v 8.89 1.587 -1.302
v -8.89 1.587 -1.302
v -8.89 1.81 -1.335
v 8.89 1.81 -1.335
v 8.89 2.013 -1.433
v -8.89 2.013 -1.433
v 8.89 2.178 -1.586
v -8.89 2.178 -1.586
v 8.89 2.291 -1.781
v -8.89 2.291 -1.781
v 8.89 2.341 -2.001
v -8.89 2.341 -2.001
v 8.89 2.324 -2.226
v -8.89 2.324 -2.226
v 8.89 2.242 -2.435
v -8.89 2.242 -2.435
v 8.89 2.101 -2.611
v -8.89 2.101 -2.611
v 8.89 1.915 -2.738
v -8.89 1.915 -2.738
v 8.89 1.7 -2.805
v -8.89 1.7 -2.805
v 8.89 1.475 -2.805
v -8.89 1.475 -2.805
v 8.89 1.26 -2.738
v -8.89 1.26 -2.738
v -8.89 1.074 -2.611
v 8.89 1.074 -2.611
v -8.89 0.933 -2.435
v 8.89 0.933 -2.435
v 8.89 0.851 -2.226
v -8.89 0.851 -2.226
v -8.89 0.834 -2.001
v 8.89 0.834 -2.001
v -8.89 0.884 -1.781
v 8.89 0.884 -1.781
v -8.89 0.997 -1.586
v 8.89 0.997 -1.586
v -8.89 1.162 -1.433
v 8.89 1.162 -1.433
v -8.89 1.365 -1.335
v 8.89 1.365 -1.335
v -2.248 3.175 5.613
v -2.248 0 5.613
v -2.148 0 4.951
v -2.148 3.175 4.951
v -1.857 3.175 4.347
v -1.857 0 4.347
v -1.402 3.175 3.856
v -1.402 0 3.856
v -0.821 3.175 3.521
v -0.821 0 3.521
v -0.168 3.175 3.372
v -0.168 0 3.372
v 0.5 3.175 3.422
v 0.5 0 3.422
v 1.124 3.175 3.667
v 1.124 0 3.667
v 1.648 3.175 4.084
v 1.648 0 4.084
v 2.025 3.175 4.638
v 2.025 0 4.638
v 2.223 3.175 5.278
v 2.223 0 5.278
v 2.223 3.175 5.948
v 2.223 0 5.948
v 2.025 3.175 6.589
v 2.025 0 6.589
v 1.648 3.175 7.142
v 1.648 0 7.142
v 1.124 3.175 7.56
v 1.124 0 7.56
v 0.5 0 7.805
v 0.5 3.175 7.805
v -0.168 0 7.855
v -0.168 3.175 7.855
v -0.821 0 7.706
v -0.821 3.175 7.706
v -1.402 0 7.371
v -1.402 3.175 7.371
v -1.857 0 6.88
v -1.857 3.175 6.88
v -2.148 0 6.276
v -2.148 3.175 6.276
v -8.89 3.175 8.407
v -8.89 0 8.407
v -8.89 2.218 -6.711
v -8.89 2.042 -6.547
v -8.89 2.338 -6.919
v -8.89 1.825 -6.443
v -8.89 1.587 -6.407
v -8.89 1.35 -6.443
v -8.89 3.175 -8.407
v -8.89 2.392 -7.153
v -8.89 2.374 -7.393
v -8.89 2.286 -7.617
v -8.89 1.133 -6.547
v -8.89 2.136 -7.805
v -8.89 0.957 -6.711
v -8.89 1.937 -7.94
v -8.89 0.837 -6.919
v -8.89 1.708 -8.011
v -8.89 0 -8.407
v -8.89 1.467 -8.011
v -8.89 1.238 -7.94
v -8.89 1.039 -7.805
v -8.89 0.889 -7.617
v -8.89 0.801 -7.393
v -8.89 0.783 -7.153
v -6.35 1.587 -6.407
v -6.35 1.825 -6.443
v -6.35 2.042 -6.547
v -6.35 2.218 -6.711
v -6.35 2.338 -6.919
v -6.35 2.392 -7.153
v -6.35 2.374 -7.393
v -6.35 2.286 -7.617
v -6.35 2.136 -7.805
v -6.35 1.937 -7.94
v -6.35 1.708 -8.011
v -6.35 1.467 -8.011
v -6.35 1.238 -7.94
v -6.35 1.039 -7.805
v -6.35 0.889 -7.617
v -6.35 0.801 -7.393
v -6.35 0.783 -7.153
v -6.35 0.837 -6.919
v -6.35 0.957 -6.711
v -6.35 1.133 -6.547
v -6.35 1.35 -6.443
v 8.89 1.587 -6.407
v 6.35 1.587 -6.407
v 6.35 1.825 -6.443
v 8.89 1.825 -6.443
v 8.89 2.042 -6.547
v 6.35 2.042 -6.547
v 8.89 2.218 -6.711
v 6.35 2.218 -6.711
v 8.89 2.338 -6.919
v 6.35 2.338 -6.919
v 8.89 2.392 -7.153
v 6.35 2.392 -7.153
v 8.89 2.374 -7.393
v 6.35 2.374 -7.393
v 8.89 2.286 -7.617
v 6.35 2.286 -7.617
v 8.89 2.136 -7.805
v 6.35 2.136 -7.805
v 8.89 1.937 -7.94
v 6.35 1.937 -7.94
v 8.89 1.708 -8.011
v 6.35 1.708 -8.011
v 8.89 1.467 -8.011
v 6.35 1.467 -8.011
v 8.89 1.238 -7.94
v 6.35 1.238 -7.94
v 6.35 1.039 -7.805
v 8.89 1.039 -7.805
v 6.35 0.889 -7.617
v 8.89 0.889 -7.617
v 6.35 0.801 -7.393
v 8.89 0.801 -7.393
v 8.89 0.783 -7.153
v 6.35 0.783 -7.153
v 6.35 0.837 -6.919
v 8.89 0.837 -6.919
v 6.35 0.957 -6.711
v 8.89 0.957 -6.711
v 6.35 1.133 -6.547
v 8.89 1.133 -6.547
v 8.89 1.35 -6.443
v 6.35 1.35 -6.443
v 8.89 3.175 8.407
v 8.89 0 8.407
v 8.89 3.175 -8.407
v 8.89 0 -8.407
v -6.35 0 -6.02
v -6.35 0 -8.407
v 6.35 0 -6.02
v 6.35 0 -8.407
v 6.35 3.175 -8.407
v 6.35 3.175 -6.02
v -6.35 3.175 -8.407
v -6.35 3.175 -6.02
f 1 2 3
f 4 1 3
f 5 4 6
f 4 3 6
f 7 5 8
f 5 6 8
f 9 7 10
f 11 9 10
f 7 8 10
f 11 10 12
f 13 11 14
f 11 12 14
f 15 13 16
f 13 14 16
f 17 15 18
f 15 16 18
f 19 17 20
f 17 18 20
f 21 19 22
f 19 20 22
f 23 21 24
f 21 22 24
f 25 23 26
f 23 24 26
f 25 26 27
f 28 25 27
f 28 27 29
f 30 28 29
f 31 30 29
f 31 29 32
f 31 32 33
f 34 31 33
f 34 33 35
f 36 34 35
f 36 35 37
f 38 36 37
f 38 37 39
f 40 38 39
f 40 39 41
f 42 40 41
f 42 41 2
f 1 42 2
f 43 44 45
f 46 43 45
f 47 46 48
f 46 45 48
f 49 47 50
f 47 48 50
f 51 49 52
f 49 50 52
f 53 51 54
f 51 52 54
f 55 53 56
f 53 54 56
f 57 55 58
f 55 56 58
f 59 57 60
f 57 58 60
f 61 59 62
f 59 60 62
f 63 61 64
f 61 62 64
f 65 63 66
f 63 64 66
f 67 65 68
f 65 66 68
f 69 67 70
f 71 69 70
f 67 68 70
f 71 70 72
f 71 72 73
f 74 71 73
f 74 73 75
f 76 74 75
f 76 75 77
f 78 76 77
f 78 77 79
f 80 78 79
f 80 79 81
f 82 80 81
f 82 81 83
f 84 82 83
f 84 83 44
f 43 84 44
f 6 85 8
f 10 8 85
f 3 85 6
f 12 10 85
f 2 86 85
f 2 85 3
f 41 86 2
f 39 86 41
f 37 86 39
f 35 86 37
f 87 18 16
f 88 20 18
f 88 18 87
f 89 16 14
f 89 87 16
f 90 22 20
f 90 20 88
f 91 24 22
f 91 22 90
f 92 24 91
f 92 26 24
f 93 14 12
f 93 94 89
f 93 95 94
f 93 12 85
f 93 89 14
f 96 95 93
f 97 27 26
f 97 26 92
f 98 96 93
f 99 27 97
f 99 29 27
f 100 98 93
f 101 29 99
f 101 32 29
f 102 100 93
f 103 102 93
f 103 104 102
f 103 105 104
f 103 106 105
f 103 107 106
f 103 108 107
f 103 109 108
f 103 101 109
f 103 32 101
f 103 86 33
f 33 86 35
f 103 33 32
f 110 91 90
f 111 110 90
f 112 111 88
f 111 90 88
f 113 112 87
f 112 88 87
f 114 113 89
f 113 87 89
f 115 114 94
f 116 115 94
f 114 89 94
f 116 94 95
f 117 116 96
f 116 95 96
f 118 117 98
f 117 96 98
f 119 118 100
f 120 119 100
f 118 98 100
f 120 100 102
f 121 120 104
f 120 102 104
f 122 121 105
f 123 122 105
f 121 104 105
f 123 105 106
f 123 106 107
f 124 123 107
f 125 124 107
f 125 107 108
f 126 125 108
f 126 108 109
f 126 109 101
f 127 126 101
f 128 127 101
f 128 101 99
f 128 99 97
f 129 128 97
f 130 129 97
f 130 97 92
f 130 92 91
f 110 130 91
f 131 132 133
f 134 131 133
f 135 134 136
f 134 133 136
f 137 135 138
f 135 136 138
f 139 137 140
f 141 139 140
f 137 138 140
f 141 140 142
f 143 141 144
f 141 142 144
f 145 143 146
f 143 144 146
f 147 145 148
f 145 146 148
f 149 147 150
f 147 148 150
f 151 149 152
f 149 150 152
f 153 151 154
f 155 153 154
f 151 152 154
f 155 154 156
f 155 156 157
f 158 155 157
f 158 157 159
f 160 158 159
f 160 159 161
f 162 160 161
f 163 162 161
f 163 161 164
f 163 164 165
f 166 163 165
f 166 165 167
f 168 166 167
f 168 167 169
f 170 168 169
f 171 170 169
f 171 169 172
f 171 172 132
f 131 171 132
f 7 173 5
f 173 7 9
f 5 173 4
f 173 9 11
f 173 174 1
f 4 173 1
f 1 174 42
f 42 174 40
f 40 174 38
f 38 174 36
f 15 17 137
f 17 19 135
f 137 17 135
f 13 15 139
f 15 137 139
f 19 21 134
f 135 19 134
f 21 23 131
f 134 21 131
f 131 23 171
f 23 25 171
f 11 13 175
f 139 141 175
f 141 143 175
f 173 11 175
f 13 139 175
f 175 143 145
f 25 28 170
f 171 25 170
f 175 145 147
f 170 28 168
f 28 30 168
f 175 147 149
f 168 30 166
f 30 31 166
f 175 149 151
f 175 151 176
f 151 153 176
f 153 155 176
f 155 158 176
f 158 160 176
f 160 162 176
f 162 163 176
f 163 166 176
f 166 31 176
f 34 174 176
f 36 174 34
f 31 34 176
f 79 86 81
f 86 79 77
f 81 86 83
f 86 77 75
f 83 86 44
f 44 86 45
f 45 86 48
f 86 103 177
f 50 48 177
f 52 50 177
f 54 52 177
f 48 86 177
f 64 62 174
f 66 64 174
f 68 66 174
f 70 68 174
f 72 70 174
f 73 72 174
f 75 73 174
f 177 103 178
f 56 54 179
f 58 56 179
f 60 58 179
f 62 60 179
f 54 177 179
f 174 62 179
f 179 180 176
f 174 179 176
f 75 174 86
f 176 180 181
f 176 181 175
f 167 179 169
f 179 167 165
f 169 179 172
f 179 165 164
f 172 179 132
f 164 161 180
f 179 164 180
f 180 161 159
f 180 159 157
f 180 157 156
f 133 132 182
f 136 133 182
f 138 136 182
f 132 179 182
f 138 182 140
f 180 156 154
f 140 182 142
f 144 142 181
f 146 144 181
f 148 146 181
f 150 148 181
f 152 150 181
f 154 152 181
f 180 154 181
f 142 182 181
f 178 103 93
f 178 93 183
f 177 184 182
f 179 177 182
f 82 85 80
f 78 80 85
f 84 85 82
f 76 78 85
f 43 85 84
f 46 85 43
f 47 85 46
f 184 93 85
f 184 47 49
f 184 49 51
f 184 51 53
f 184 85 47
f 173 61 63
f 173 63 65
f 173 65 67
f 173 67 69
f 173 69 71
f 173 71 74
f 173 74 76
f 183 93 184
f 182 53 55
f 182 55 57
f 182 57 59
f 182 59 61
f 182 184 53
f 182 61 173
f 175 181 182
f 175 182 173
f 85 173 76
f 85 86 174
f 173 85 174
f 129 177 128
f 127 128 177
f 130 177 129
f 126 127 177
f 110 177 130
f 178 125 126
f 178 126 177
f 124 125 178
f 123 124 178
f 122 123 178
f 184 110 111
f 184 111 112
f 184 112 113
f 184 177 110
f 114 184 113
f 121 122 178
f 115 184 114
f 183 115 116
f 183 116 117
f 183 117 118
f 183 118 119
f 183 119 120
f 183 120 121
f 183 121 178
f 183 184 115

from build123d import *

# Parameters (mm, degrees)
SKETCH1_W             = 17.78
SKETCH1_H             = 16.8148
BOSS_EXTRUDE1_DEPTH   = 3.175
SKETCH2_W             = 12.7
SKETCH2_H             = 4.7752
CUT_EXTRUDE1_DEPTH    = 13.64108776
F_8_CLEARANCE_HOLE1_D = 4.4958
F_0_CLEARANCE_HOLE1_D = 1.6129
F_1_72_TAPPED_HOLE1_D = 1.5113


with BuildPart() as part:
    # Sketch1 → Boss-Extrude1 (new body)
    with BuildSketch(Plane(origin=(0, 0, 0), x_dir=(1, 0, 0), z_dir=(0, 1, 0))):
        Rectangle(SKETCH1_W, SKETCH1_H)
    extrude(amount=BOSS_EXTRUDE1_DEPTH)

    # Sketch2 → Cut-Extrude1 (cut, through all)
    with BuildSketch(Plane(origin=(0, 3.175, 0), x_dir=(1, 0, 0), z_dir=(0, 1, 0))):
        with Locations((0, 8.4074)):
            Rectangle(SKETCH2_W, SKETCH2_H)
    extrude(amount=-CUT_EXTRUDE1_DEPTH, mode=Mode.SUBTRACT)

    # #8 Clearance Hole1 (through all)
    with Locations(Plane(origin=(0, 3.175, 0), x_dir=(1, 0, 0), z_dir=(0, 1, 0))):
        with Locations((0, -5.6134)):
            Hole(F_8_CLEARANCE_HOLE1_D / 2)

    # #0 Clearance Hole1 (through all)
    with Locations(Plane(origin=(8.89, 0, 0), x_dir=(0, 0, -1), z_dir=(1, 0, 0))):
        with Locations((7.2136, 1.5875)):
            Hole(F_0_CLEARANCE_HOLE1_D / 2)

    # #1-72 Tapped Hole1 (through all)
    with Locations(Plane(origin=(8.89, 0, 0), x_dir=(0, 0, -1), z_dir=(1, 0, 0))):
        with Locations((2.0574, 1.5875)):
            Hole(F_1_72_TAPPED_HOLE1_D / 2)


solid = part.part
